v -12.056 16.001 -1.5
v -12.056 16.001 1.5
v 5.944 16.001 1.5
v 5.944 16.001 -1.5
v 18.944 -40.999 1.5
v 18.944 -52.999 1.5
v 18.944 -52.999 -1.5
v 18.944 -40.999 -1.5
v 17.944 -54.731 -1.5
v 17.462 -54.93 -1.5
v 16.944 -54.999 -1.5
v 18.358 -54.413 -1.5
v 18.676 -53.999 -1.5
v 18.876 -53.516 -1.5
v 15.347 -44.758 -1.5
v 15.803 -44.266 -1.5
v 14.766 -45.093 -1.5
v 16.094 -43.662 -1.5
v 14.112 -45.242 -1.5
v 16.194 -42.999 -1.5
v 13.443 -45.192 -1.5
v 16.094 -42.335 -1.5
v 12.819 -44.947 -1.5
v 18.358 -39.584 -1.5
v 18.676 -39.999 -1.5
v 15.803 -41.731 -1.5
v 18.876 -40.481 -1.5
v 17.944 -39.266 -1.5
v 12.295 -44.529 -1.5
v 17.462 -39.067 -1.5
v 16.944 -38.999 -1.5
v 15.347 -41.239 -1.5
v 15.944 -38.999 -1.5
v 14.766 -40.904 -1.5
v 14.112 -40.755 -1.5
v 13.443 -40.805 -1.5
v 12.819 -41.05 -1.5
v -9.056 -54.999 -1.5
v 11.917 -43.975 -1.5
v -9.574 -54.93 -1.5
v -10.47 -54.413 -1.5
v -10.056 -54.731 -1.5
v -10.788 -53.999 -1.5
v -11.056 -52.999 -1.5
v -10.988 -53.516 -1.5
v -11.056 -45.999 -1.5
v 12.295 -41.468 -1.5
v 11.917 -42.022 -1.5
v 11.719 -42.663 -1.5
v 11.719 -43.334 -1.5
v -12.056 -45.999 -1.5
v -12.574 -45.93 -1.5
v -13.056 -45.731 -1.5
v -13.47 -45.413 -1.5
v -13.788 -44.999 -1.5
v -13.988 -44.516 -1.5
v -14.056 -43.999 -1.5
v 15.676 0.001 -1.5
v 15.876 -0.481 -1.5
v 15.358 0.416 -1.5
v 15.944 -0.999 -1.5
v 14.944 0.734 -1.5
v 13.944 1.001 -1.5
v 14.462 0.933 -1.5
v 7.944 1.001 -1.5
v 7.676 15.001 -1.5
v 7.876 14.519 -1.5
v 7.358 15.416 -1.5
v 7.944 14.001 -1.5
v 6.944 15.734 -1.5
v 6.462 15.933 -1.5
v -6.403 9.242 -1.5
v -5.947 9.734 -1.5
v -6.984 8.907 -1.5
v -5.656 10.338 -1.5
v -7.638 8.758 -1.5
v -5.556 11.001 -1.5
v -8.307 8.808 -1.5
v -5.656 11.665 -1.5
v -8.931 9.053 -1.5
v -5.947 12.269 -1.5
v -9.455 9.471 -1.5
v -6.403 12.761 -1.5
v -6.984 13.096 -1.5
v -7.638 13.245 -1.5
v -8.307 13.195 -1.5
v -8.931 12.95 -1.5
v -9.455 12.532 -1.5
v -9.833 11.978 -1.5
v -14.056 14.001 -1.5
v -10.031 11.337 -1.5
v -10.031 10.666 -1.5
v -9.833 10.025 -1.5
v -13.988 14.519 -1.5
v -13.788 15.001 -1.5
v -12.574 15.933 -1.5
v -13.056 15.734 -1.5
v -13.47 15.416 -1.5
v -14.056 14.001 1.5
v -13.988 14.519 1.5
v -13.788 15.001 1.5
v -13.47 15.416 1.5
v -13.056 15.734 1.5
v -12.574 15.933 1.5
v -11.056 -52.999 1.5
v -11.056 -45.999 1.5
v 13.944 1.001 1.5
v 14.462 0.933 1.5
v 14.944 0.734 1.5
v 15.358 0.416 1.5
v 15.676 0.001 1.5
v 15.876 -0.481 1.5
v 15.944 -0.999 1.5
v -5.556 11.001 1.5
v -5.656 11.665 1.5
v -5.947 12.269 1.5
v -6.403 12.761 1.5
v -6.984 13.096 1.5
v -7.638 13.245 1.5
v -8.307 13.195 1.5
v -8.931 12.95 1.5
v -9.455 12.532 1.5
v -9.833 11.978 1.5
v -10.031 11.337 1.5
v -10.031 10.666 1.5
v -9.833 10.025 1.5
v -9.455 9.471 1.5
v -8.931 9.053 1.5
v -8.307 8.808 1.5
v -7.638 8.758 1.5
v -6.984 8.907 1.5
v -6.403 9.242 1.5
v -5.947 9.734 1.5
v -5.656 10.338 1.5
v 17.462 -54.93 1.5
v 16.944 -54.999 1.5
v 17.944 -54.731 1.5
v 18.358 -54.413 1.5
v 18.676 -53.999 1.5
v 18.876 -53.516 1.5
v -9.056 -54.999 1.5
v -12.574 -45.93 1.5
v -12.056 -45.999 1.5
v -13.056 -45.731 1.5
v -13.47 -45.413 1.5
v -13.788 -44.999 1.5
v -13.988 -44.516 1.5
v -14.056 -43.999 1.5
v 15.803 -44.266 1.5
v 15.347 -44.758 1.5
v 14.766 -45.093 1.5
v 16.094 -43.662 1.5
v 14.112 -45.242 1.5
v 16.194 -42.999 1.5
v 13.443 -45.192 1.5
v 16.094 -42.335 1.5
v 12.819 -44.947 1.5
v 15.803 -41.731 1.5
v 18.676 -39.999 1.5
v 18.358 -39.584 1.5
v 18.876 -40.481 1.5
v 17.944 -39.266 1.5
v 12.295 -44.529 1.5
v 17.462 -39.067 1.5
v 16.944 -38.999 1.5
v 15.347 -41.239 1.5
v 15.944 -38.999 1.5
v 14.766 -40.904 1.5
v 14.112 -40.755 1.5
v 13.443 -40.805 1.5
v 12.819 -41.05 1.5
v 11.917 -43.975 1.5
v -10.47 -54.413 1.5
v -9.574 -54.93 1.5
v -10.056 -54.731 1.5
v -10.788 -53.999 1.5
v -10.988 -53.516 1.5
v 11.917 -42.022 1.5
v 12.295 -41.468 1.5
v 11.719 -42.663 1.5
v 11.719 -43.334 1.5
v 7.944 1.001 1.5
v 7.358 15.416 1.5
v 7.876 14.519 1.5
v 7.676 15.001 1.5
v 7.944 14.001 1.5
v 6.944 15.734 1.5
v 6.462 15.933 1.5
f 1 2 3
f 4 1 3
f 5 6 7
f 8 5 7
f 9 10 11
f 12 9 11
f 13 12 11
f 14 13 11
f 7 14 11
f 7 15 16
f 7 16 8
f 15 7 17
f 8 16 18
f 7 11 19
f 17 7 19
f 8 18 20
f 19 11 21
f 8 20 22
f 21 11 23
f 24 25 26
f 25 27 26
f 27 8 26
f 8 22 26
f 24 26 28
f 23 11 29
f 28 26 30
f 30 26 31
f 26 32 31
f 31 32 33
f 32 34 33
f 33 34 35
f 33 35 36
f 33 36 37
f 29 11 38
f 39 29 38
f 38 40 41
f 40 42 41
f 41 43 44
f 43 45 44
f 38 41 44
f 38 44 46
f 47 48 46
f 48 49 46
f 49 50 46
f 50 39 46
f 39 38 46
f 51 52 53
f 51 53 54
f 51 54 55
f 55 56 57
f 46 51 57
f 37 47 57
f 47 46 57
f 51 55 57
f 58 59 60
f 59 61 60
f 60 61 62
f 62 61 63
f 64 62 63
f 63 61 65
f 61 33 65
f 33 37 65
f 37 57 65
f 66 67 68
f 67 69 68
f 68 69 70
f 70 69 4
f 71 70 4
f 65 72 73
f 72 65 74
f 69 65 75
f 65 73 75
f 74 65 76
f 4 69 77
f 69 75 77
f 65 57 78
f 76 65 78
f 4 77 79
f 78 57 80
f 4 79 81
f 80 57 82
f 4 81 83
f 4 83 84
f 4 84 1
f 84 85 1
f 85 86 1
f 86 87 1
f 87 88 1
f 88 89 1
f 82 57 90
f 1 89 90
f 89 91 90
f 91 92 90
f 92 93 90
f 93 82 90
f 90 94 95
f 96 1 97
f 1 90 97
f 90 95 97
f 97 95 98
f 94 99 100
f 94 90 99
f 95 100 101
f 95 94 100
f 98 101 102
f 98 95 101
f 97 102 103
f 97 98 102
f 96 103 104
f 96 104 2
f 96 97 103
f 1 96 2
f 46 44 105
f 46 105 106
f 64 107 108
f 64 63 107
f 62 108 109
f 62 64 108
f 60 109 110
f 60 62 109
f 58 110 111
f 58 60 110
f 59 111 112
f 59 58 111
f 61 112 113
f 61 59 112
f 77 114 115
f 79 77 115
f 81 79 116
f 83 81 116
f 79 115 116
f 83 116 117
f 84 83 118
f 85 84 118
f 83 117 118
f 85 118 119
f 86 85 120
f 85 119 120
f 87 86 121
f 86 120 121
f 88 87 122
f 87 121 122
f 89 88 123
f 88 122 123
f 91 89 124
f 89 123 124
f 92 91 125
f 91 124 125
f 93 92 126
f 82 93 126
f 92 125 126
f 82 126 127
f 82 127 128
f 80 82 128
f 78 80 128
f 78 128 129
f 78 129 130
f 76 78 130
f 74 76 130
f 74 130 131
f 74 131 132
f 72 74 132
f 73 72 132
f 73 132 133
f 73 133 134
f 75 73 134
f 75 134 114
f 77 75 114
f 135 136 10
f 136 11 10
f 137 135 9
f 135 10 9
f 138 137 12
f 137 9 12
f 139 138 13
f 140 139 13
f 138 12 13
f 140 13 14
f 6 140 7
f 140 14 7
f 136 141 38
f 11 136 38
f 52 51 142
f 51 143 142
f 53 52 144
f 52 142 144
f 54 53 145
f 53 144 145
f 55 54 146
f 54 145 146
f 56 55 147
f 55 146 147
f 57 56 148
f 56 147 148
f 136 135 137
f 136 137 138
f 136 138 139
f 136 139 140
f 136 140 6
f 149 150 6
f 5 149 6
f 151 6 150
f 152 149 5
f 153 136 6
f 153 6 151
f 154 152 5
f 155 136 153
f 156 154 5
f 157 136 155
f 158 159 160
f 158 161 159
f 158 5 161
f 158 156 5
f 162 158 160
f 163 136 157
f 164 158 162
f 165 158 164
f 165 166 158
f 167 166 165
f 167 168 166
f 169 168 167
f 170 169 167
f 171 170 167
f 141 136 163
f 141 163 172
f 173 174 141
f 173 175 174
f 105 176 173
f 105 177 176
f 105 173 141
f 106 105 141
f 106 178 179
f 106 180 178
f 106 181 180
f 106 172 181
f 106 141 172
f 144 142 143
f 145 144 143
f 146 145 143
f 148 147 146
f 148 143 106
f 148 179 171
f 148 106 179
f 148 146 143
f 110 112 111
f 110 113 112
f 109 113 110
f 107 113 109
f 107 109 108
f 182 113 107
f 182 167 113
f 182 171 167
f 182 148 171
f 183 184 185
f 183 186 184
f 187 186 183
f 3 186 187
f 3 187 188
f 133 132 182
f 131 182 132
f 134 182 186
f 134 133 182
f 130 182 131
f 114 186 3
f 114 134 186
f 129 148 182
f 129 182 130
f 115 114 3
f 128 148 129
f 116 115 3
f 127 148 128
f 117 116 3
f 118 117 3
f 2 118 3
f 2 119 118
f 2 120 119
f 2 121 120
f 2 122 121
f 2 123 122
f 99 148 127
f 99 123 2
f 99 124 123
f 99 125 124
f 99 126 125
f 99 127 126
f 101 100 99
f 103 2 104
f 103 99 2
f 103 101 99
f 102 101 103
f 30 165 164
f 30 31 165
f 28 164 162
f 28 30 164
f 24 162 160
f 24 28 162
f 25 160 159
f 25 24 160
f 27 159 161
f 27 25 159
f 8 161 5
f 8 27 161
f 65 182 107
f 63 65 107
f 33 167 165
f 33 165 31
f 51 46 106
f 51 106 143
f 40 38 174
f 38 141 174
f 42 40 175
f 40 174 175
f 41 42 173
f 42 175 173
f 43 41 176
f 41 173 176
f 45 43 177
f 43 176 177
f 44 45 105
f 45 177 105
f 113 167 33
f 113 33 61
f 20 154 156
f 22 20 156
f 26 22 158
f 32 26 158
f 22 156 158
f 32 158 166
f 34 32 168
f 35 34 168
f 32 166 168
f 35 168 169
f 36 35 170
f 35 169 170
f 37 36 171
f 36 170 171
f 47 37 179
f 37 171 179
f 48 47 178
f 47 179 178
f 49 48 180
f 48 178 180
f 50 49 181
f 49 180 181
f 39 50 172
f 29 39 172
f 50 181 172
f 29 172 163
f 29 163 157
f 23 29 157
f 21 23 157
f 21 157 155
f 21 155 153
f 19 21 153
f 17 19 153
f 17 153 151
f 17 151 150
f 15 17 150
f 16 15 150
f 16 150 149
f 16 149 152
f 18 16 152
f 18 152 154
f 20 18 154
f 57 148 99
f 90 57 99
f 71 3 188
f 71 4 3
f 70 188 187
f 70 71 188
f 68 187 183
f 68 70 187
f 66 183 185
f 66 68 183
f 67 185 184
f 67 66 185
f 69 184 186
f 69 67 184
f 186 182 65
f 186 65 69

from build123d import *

# Parameters (mm, degrees)
SKETCH1_W            = 30
SKETCH1_H            = 71
BOSS_EXTRUDE1_DEPTH  = 1.5
SKETCH3_W            = 8
SKETCH3_H            = 15
CUT_EXTRUDE1_DEPTH   = 58.341547982
SKETCH6_W            = 3
SKETCH6_H            = 16
BOSS_EXTRUDE2_DEPTH  = 3
M4_CLEARANCE_HOLE1_D = 4.5
SKETCH9_W            = 3
SKETCH9_H            = 9
CUT_EXTRUDE2_DEPTH   = 59.247041392
FILLET1_R            = 2


with BuildPart() as part:
    # Sketch1 → Boss-Extrude1 (new, symmetric)
    with BuildSketch(Plane.XY):
        with Locations((0.944117647, -19.498529412)):
            Rectangle(SKETCH1_W, SKETCH1_H)
    extrude(amount=BOSS_EXTRUDE1_DEPTH, both=True)

    # Sketch3 → Cut-Extrude1 (cut, through all)
    with BuildSketch(Plane.XY.offset(1.5)):
        with Locations((11.944117647, 8.501470588)):
            Rectangle(SKETCH3_W, SKETCH3_H)
    extrude(amount=-CUT_EXTRUDE1_DEPTH, mode=Mode.SUBTRACT)

    # Sketch6 → Boss-Extrude2 (add)
    with BuildSketch(Plane(origin=(15.944117647, 0, 0), x_dir=(0, 0, -1), z_dir=(1, 0, 0))):
        with Locations((0, -46.998529412)):
            Rectangle(SKETCH6_W, SKETCH6_H)
    extrude(amount=BOSS_EXTRUDE2_DEPTH)

    # M4 Clearance Hole1 (through all)
    with Locations(Plane(origin=(0, 0, -1.5), x_dir=(-1, 0, 0), z_dir=(0, 0, -1))):
        with Locations((7.805882353, 11.001470588), (-13.944117647, -42.998529412)):
            Hole(M4_CLEARANCE_HOLE1_D / 2)

    # Sketch9 → Cut-Extrude2 (cut, through all)
    with BuildSketch(Plane(origin=(0, 0, -1.5), x_dir=(-1, 0, 0), z_dir=(0, 0, -1))):
        with Locations((12.555882353, -50.498529412)):
            Rectangle(SKETCH9_W, SKETCH9_H)
    extrude(amount=-CUT_EXTRUDE2_DEPTH, mode=Mode.SUBTRACT)

    # Fillet1
    fillet1_edges = [part.edges().sort_by_distance(p)[0] for p in [
        (15.944117647, 1.001470588, 0),
        (7.944117647, 16.001470588, 0),
        (18.944117647, -38.998529412, 0),
        (18.944117647, -54.998529412, 0),
        (-14.055882353, -45.998529412, 0),
        (-11.055882353, -54.998529412, 0),
        (-14.055882353, 16.001470588, 0),
    ]]
    fillet(fillet1_edges, radius=FILLET1_R)


solid = part.part
